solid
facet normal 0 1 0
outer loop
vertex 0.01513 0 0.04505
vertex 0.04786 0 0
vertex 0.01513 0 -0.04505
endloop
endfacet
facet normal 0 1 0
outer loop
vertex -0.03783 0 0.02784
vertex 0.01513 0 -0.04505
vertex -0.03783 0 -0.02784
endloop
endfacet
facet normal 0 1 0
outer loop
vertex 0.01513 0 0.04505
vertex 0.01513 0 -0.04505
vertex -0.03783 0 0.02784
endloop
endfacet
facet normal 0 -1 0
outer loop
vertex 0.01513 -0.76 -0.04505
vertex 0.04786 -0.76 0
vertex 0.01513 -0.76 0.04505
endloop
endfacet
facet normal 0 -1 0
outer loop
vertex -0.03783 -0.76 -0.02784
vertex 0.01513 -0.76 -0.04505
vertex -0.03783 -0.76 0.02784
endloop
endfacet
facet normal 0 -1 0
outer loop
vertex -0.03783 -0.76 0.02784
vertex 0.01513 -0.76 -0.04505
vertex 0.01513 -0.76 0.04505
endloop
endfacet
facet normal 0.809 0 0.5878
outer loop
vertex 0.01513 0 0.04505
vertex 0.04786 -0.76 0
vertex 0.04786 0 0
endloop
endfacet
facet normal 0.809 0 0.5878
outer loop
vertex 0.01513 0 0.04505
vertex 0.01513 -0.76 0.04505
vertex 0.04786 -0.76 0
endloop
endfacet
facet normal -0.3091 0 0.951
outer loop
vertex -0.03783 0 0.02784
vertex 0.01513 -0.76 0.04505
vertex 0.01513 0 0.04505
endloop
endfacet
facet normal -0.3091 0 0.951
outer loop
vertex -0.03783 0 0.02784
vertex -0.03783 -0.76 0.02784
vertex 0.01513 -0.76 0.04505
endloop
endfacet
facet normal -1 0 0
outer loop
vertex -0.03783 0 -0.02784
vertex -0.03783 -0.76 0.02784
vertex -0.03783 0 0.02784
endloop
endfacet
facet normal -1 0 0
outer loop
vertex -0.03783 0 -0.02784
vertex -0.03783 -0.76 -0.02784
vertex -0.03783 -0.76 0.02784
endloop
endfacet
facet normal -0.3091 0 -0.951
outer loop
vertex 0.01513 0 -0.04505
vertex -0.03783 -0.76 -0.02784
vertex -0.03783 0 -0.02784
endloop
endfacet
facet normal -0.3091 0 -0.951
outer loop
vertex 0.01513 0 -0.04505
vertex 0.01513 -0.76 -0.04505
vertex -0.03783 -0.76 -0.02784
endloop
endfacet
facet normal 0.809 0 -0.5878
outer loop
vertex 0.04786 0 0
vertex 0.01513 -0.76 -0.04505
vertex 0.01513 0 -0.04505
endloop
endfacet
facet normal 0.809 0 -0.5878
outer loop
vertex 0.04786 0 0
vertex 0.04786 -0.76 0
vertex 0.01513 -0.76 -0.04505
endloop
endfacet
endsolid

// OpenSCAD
EPS = 0.01;

translate([-0.046875, 0.0, 0.0])
rotate([90, 0, 0])
translate([0.04736842105263158, 0.0, 0.0])
linear_extrude(height=0.75 + EPS)
    circle(r=0.04736842105263158);
